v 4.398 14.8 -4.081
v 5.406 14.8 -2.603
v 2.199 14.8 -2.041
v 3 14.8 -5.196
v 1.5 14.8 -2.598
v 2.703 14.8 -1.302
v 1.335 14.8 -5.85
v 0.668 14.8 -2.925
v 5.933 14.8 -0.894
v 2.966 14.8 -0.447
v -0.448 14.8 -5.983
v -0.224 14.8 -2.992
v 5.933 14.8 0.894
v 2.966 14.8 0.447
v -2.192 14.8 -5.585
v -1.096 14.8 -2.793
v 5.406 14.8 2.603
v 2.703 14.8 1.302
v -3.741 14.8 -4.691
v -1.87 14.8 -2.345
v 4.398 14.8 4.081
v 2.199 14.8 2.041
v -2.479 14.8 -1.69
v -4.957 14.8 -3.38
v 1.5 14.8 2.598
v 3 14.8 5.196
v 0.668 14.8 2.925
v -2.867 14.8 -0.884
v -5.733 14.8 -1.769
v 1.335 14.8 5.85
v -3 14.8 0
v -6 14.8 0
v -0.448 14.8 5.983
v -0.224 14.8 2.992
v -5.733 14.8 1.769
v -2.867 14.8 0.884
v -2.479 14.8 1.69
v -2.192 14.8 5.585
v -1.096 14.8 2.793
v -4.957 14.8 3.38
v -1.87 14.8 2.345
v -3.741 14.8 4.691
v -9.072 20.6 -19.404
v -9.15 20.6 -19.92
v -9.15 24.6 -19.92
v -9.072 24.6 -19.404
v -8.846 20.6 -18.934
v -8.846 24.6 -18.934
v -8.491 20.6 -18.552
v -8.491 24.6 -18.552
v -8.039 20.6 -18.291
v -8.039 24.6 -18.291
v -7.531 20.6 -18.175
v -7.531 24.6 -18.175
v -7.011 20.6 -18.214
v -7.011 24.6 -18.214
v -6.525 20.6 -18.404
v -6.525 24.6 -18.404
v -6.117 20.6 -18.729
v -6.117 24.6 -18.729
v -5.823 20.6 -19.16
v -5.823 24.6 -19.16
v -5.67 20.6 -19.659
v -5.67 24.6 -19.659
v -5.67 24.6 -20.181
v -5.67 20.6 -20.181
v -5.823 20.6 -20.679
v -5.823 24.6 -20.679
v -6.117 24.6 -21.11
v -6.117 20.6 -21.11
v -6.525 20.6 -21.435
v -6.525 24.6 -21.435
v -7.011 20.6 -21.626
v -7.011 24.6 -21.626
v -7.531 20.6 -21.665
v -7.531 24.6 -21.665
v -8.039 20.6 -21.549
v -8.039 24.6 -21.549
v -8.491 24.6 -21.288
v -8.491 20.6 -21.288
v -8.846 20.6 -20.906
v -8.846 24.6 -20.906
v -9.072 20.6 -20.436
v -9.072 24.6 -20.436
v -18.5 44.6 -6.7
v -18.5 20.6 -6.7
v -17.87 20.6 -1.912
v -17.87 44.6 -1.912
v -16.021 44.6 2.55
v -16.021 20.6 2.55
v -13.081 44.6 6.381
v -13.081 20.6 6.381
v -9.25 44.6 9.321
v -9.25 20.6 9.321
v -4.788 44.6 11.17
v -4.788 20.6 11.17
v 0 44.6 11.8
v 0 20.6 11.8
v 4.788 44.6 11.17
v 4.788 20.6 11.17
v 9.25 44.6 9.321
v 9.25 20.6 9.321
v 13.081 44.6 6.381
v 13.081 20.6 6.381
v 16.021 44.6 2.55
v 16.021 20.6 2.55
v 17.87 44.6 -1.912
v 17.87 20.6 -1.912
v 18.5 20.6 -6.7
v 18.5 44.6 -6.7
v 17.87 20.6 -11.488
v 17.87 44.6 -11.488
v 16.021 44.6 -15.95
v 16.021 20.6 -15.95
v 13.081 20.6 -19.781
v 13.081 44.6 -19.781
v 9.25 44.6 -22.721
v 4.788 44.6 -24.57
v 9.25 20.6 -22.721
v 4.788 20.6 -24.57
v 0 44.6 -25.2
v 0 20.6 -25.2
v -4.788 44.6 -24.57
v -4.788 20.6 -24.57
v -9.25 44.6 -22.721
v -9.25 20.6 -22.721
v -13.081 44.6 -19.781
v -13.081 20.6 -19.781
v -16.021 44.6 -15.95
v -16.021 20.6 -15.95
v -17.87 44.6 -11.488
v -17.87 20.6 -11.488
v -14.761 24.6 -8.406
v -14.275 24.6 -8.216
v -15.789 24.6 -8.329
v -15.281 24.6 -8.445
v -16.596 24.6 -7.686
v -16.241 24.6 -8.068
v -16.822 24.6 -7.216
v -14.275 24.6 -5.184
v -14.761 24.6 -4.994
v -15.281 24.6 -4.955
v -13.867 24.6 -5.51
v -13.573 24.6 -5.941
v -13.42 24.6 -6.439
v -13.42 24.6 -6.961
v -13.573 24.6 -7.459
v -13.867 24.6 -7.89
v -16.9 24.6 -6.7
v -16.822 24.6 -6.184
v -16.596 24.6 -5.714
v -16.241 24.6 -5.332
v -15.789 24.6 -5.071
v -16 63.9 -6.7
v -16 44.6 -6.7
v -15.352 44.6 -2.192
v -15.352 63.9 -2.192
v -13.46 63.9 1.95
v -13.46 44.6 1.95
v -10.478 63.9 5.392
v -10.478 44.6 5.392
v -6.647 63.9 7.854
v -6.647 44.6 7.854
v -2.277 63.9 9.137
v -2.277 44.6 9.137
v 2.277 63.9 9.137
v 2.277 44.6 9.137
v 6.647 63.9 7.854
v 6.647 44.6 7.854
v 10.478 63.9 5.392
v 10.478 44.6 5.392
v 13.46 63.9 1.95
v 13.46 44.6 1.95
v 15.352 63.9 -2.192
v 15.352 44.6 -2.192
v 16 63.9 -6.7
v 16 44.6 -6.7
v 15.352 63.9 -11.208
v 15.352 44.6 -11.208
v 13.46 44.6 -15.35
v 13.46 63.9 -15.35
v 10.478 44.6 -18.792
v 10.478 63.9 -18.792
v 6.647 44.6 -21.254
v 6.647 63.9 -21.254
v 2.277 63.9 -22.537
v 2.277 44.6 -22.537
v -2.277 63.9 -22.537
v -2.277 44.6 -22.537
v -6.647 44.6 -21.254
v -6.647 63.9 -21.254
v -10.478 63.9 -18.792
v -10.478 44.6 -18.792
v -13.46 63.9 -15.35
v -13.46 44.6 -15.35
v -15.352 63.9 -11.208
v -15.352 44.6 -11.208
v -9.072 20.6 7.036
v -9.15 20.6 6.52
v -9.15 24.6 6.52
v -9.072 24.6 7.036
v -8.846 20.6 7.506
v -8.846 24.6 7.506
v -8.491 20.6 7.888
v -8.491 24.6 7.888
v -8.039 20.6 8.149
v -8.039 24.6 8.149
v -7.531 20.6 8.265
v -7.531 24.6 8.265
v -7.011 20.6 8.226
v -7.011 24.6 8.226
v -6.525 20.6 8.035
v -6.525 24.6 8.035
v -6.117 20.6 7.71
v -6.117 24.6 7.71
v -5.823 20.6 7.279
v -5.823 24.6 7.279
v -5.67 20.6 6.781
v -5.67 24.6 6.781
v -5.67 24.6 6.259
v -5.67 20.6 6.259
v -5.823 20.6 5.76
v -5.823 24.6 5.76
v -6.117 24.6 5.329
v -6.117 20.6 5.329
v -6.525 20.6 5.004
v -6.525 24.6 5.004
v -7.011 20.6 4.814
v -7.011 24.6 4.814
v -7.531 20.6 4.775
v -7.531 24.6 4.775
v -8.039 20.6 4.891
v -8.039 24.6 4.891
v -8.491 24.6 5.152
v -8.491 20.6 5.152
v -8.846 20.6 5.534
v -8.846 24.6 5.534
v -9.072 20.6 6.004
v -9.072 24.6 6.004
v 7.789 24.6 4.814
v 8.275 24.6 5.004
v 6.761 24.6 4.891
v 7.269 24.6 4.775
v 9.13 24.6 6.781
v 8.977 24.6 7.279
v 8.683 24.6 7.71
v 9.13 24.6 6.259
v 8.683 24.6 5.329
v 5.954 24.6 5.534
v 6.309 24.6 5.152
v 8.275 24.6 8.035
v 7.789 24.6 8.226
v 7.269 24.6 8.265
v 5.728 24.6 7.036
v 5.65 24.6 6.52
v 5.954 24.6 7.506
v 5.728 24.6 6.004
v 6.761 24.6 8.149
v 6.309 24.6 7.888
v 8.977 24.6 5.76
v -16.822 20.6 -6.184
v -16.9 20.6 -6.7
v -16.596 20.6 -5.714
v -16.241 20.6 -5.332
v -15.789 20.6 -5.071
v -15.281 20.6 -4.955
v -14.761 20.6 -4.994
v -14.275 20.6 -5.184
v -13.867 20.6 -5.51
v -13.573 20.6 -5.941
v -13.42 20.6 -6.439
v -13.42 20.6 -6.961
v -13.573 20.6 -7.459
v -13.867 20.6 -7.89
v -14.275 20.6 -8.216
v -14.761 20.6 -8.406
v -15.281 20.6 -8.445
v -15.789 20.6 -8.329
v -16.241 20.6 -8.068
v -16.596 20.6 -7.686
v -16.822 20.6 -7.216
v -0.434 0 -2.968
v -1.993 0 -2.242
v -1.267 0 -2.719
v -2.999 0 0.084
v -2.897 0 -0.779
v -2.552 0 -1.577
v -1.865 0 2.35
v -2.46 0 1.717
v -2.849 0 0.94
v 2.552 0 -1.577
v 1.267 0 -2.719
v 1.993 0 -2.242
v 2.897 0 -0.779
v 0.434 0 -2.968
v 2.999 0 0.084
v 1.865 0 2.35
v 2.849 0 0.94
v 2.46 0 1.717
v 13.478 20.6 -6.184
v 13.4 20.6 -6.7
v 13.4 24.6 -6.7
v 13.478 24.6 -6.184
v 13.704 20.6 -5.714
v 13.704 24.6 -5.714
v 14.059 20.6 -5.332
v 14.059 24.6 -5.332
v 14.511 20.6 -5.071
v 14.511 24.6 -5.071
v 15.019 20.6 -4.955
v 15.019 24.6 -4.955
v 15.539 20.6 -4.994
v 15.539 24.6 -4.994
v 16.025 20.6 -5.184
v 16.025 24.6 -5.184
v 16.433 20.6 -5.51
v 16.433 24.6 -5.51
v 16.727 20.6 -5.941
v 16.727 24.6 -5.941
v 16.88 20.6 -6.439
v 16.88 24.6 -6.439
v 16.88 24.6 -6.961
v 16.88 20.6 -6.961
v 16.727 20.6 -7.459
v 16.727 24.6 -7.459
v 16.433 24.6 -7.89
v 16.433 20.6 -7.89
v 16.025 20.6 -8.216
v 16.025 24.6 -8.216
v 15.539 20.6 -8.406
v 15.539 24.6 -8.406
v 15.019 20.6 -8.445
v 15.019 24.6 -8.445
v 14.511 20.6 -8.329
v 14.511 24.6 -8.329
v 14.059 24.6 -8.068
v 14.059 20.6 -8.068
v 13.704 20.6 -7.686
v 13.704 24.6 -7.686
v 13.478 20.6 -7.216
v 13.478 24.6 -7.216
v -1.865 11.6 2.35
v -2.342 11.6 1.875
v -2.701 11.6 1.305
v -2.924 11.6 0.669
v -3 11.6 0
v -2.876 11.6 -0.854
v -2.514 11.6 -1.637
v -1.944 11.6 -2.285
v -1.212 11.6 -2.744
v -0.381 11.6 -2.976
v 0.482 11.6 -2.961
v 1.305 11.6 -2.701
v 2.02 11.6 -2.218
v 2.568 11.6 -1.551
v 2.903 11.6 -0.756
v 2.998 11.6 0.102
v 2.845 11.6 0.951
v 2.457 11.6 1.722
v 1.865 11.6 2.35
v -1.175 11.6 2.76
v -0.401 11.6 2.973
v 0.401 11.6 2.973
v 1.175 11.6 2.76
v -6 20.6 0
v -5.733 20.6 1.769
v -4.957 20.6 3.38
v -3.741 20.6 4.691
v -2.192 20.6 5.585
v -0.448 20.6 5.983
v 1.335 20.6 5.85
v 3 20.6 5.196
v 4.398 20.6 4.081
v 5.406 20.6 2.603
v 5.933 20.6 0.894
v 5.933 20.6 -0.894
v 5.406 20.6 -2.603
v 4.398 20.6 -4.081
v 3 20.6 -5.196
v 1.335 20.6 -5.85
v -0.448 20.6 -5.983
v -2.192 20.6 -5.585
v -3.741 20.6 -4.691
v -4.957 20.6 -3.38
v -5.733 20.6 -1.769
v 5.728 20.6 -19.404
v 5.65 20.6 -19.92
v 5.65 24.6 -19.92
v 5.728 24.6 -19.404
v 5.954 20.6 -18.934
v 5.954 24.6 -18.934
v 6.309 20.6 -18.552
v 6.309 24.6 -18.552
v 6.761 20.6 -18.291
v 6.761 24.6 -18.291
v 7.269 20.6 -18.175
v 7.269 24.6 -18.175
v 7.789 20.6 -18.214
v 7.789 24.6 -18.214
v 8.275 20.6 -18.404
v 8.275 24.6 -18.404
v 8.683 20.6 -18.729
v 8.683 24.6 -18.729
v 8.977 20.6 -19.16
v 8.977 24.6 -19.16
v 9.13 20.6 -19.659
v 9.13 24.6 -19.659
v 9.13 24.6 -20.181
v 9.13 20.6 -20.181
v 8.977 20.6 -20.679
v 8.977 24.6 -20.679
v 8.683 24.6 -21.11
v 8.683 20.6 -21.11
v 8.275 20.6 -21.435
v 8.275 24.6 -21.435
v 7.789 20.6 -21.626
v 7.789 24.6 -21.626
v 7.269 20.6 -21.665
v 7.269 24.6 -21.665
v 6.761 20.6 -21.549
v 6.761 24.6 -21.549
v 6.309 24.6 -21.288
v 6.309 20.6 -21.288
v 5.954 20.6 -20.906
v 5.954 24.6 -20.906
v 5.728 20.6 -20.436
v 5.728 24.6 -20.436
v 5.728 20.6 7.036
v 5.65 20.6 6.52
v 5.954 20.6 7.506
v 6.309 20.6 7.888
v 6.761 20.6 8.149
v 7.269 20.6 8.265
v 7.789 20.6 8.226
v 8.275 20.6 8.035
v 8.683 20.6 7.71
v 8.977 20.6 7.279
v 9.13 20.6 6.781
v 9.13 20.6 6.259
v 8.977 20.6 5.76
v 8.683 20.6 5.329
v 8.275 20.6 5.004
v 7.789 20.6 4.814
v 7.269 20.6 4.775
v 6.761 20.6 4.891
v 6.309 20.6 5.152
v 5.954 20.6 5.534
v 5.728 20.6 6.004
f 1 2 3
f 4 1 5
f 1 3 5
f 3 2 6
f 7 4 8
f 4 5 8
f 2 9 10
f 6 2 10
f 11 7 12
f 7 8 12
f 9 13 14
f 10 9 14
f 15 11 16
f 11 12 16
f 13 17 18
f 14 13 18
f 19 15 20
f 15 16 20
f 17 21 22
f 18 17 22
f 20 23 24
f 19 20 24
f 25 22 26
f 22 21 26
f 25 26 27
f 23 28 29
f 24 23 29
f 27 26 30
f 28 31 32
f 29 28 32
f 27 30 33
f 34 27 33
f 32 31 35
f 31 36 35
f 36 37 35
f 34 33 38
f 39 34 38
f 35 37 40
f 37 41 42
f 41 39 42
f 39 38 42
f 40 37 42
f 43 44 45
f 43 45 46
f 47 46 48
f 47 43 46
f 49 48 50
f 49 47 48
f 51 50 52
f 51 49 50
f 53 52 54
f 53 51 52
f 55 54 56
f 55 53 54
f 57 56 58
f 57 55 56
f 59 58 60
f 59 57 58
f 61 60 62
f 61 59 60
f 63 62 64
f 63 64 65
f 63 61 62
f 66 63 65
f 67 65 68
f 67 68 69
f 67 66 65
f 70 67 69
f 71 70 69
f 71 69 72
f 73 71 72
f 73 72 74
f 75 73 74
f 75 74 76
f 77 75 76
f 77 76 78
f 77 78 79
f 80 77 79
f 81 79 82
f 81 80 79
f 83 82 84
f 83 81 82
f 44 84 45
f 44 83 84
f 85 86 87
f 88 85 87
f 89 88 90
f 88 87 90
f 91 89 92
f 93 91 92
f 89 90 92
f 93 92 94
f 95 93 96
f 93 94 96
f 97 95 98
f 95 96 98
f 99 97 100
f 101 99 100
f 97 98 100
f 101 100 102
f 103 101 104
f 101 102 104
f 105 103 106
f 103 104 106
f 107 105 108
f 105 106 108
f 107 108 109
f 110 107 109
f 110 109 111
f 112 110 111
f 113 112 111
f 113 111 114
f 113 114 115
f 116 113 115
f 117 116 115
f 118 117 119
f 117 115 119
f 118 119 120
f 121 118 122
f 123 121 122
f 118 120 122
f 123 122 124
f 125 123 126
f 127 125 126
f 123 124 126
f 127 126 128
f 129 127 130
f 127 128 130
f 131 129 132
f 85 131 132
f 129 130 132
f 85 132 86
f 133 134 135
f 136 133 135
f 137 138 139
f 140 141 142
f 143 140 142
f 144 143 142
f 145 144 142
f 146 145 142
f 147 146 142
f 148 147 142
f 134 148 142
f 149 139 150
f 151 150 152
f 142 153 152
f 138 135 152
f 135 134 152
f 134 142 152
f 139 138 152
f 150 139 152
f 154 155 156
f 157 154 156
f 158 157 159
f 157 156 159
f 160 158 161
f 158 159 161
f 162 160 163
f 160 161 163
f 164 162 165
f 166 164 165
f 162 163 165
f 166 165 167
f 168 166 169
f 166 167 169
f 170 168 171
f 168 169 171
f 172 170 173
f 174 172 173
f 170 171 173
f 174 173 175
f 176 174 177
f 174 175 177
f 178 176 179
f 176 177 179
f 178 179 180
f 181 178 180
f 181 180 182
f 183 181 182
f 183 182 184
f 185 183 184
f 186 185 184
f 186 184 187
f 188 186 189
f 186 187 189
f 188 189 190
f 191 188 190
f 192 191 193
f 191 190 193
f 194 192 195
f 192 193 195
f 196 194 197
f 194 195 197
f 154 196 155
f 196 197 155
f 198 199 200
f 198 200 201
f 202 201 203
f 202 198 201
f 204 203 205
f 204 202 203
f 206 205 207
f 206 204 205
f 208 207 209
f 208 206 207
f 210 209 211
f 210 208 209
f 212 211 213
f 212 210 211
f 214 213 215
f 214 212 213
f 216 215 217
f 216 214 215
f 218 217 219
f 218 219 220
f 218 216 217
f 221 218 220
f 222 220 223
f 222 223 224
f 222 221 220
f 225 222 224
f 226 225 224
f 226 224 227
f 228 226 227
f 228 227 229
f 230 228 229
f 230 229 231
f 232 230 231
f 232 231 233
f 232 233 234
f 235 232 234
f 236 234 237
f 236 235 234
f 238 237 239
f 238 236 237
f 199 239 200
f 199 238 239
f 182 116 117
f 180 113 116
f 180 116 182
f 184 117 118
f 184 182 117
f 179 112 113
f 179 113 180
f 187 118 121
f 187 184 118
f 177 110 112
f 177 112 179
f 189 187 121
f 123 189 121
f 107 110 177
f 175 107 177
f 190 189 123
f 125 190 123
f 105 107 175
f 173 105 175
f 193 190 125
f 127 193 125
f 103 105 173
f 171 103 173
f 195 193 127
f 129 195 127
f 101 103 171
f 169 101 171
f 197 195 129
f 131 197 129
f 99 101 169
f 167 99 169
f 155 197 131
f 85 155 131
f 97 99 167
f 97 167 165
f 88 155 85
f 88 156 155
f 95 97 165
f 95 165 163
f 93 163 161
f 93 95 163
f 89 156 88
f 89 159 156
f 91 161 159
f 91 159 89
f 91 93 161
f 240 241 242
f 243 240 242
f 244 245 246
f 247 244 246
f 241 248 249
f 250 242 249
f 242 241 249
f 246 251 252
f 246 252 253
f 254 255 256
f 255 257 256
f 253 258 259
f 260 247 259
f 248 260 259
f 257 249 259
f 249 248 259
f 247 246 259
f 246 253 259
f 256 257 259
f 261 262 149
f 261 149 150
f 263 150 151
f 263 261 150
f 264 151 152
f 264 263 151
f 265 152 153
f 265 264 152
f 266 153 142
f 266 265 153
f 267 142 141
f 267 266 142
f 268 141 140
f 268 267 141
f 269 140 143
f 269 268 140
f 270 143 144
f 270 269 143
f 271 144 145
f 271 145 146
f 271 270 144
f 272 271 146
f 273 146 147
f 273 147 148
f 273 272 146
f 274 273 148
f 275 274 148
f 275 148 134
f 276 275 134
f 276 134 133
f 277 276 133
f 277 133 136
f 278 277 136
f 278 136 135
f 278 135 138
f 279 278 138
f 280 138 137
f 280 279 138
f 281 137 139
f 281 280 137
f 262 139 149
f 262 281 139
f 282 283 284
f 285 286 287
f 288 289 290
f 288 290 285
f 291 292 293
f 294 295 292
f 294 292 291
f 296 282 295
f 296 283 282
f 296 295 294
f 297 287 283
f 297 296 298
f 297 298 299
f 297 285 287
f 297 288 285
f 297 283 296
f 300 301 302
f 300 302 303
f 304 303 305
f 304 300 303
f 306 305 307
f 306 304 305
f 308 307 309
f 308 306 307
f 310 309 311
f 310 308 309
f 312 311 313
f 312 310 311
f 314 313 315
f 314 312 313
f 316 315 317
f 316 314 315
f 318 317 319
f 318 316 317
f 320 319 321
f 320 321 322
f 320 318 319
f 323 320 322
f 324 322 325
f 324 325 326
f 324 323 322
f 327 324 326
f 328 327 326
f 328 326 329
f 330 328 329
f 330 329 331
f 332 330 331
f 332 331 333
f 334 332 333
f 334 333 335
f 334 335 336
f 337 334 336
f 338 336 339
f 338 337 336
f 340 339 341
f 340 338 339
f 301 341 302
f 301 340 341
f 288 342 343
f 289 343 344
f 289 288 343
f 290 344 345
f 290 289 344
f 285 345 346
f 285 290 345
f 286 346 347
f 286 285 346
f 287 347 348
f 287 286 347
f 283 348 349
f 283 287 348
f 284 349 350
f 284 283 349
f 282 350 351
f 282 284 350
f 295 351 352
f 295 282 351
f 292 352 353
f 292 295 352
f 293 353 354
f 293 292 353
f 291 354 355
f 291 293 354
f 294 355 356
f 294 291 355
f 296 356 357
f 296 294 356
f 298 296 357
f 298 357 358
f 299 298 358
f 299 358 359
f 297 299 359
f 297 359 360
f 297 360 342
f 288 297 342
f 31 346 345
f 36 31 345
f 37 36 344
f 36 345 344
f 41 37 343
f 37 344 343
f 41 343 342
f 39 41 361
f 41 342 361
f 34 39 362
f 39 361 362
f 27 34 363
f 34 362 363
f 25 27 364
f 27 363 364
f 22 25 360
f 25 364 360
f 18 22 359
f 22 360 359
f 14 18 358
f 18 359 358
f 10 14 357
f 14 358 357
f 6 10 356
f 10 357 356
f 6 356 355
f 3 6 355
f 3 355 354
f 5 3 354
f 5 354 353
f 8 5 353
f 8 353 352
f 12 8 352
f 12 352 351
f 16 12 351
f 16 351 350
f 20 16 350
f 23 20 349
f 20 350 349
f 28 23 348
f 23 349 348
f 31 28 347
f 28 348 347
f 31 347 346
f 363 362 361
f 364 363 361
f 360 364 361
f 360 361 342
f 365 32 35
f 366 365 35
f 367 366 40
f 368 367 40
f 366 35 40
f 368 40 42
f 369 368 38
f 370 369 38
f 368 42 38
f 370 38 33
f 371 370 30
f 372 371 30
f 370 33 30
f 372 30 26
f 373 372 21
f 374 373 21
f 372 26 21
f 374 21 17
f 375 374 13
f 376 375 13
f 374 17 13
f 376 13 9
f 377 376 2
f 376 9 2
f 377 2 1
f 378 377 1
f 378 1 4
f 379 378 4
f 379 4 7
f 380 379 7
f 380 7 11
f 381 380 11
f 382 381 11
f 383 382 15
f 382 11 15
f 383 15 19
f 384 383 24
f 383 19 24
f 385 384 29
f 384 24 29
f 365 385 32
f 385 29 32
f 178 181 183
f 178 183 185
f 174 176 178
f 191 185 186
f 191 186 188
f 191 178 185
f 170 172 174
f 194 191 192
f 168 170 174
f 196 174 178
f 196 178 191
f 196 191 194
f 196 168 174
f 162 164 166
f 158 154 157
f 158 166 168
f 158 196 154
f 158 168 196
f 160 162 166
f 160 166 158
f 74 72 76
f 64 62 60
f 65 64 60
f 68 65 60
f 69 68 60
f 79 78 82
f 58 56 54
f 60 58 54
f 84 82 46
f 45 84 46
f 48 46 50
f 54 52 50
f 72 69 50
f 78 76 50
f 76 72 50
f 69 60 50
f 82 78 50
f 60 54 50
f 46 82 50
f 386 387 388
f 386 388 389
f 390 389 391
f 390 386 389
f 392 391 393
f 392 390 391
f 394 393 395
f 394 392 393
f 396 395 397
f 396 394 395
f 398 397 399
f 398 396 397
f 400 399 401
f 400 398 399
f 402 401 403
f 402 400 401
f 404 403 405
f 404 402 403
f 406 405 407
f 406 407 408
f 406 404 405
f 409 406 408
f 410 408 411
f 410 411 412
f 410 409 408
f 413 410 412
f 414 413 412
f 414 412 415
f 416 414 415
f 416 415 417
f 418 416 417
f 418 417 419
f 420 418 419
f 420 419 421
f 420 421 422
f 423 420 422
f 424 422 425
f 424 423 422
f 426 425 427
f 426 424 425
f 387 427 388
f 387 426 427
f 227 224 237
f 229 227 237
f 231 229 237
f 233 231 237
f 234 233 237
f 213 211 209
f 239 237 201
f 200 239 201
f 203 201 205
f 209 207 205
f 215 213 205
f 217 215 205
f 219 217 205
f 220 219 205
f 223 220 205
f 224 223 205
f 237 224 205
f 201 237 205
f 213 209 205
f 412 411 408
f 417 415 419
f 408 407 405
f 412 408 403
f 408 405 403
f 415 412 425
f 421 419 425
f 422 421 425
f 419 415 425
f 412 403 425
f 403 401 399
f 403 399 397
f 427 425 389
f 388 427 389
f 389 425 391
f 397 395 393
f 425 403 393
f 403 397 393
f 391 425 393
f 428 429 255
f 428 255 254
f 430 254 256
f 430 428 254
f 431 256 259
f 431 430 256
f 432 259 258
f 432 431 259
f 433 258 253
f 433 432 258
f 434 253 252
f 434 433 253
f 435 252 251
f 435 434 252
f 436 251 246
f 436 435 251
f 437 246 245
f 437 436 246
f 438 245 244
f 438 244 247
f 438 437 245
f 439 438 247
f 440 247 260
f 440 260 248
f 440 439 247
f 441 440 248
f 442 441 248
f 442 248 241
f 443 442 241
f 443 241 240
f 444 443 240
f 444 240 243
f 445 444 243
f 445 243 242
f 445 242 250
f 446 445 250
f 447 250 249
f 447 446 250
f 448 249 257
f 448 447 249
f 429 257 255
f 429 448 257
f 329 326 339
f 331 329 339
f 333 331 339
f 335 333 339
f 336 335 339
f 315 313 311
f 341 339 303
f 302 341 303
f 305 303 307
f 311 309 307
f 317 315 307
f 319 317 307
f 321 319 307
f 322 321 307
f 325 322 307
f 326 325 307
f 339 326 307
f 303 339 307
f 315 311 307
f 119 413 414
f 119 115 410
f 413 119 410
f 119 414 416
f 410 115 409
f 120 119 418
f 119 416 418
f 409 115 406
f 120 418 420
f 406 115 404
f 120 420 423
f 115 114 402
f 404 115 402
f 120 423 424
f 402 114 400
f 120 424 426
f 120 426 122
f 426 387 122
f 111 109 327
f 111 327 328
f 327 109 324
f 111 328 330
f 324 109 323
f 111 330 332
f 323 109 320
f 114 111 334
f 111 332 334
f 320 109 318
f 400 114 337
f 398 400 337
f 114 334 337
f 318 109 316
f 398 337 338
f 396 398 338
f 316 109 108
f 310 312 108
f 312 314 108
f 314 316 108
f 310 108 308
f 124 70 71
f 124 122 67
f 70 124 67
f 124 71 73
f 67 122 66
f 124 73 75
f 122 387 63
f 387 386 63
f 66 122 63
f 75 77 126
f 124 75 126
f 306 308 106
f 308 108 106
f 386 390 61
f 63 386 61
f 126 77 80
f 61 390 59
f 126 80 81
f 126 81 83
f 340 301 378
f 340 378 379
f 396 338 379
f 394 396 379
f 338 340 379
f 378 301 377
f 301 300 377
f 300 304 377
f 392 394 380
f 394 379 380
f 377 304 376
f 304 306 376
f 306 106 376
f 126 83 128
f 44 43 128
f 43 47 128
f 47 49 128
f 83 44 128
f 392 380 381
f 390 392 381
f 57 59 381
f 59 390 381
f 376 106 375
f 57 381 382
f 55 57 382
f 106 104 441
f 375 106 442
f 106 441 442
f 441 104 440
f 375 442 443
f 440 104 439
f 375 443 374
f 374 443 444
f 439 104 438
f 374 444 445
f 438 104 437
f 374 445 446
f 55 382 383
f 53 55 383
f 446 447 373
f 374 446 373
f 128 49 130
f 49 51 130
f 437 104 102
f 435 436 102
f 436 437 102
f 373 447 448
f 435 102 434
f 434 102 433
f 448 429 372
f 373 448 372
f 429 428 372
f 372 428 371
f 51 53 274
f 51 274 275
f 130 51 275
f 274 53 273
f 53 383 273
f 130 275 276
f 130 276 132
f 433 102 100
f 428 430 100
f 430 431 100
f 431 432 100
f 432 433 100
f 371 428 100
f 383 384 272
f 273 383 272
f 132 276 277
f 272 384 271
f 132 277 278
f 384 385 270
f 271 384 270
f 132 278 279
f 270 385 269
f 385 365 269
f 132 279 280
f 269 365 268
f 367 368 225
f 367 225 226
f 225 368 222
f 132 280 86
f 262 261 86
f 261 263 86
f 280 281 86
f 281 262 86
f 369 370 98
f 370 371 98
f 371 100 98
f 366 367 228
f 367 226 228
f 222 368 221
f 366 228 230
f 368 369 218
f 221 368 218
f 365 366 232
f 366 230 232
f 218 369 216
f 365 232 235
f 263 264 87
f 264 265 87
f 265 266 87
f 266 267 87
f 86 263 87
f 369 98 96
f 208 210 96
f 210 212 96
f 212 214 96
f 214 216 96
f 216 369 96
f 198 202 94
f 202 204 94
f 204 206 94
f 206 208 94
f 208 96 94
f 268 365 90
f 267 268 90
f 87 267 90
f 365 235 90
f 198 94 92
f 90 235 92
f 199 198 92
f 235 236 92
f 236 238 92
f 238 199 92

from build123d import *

# Parameters (mm, degrees)
F1_DEPTH  = 11.6
F3_R      = 3
F4_DEPTH  = 3.2
F6_R      = 6
F7_DEPTH  = 5.8
F9_R      = 18.5
F10_DEPTH = 24
F12_R     = 16
F13_DEPTH = 19.3
F14_R     = 1.75
F15_DEPTH = 4


# Not quite as in the source:
# - after a boolean that leaves OpenCascade's solid faulty, fix() repairs it


with BuildPart() as f1:
    # F0 (on Front) → F1 (new body)
    with BuildSketch(Plane.XZ):
        with BuildLine():
            Line((1.8648056199, 2.35), (-1.8648056199, 2.35))
            ThreePointArc((-1.8648056199, 2.35), (0, -3), (1.8648056199, 2.35))
        make_face()
    extrude(amount=-F1_DEPTH)

    # F3 (on offset) → F4 (join)
    with BuildSketch(Plane(origin=(0, 11.6, 0), x_dir=(-1, 0, 0), z_dir=(0, 1, 0))):
        Circle(F3_R)
    extrude(amount=F4_DEPTH)

    # F6 (on offset) → F7 (join)
    with BuildSketch(Plane(origin=(0, 14.8, 0), x_dir=(-1, 0, 0), z_dir=(0, 1, 0))):
        Circle(F6_R)
    extrude(amount=F7_DEPTH)

    add(f1.part.fix(), mode=Mode.REPLACE)

    # F9 (on offset) → F10 (join)
    with BuildSketch(Plane(origin=(0, 20.6, 0), x_dir=(-1, 0, 0), z_dir=(0, 1, 0))):
        with Locations((0, -6.7)):
            Circle(F9_R)
    extrude(amount=F10_DEPTH)

    # F12 (on offset) → F13 (join)
    with BuildSketch(Plane(origin=(0, 44.6, 0), x_dir=(-1, 0, 0), z_dir=(0, 1, 0))):
        with Locations((0, -6.7)):
            Circle(F12_R)
    extrude(amount=F13_DEPTH)

    # F14 (on offset) → F15 (cut)
    with BuildSketch(Plane(origin=(0, 20.6, 0), x_dir=(-1, 0, 0), z_dir=(0, 1, 0))):
        with Locations((-15.15, -6.7)):
            Circle(F14_R)
        with Locations((15.15, -6.7)):
            Circle(F14_R)
        with Locations((7.4, -19.9197768514)):
            Circle(F14_R)
        with Locations((-7.4, -19.9197768514)):
            Circle(F14_R)
        with Locations((-7.4, 6.5197768514)):
            Circle(F14_R)
        with Locations((7.4, 6.5197768514)):
            Circle(F14_R)
    extrude(amount=F15_DEPTH, mode=Mode.SUBTRACT)


solid = f1.part
